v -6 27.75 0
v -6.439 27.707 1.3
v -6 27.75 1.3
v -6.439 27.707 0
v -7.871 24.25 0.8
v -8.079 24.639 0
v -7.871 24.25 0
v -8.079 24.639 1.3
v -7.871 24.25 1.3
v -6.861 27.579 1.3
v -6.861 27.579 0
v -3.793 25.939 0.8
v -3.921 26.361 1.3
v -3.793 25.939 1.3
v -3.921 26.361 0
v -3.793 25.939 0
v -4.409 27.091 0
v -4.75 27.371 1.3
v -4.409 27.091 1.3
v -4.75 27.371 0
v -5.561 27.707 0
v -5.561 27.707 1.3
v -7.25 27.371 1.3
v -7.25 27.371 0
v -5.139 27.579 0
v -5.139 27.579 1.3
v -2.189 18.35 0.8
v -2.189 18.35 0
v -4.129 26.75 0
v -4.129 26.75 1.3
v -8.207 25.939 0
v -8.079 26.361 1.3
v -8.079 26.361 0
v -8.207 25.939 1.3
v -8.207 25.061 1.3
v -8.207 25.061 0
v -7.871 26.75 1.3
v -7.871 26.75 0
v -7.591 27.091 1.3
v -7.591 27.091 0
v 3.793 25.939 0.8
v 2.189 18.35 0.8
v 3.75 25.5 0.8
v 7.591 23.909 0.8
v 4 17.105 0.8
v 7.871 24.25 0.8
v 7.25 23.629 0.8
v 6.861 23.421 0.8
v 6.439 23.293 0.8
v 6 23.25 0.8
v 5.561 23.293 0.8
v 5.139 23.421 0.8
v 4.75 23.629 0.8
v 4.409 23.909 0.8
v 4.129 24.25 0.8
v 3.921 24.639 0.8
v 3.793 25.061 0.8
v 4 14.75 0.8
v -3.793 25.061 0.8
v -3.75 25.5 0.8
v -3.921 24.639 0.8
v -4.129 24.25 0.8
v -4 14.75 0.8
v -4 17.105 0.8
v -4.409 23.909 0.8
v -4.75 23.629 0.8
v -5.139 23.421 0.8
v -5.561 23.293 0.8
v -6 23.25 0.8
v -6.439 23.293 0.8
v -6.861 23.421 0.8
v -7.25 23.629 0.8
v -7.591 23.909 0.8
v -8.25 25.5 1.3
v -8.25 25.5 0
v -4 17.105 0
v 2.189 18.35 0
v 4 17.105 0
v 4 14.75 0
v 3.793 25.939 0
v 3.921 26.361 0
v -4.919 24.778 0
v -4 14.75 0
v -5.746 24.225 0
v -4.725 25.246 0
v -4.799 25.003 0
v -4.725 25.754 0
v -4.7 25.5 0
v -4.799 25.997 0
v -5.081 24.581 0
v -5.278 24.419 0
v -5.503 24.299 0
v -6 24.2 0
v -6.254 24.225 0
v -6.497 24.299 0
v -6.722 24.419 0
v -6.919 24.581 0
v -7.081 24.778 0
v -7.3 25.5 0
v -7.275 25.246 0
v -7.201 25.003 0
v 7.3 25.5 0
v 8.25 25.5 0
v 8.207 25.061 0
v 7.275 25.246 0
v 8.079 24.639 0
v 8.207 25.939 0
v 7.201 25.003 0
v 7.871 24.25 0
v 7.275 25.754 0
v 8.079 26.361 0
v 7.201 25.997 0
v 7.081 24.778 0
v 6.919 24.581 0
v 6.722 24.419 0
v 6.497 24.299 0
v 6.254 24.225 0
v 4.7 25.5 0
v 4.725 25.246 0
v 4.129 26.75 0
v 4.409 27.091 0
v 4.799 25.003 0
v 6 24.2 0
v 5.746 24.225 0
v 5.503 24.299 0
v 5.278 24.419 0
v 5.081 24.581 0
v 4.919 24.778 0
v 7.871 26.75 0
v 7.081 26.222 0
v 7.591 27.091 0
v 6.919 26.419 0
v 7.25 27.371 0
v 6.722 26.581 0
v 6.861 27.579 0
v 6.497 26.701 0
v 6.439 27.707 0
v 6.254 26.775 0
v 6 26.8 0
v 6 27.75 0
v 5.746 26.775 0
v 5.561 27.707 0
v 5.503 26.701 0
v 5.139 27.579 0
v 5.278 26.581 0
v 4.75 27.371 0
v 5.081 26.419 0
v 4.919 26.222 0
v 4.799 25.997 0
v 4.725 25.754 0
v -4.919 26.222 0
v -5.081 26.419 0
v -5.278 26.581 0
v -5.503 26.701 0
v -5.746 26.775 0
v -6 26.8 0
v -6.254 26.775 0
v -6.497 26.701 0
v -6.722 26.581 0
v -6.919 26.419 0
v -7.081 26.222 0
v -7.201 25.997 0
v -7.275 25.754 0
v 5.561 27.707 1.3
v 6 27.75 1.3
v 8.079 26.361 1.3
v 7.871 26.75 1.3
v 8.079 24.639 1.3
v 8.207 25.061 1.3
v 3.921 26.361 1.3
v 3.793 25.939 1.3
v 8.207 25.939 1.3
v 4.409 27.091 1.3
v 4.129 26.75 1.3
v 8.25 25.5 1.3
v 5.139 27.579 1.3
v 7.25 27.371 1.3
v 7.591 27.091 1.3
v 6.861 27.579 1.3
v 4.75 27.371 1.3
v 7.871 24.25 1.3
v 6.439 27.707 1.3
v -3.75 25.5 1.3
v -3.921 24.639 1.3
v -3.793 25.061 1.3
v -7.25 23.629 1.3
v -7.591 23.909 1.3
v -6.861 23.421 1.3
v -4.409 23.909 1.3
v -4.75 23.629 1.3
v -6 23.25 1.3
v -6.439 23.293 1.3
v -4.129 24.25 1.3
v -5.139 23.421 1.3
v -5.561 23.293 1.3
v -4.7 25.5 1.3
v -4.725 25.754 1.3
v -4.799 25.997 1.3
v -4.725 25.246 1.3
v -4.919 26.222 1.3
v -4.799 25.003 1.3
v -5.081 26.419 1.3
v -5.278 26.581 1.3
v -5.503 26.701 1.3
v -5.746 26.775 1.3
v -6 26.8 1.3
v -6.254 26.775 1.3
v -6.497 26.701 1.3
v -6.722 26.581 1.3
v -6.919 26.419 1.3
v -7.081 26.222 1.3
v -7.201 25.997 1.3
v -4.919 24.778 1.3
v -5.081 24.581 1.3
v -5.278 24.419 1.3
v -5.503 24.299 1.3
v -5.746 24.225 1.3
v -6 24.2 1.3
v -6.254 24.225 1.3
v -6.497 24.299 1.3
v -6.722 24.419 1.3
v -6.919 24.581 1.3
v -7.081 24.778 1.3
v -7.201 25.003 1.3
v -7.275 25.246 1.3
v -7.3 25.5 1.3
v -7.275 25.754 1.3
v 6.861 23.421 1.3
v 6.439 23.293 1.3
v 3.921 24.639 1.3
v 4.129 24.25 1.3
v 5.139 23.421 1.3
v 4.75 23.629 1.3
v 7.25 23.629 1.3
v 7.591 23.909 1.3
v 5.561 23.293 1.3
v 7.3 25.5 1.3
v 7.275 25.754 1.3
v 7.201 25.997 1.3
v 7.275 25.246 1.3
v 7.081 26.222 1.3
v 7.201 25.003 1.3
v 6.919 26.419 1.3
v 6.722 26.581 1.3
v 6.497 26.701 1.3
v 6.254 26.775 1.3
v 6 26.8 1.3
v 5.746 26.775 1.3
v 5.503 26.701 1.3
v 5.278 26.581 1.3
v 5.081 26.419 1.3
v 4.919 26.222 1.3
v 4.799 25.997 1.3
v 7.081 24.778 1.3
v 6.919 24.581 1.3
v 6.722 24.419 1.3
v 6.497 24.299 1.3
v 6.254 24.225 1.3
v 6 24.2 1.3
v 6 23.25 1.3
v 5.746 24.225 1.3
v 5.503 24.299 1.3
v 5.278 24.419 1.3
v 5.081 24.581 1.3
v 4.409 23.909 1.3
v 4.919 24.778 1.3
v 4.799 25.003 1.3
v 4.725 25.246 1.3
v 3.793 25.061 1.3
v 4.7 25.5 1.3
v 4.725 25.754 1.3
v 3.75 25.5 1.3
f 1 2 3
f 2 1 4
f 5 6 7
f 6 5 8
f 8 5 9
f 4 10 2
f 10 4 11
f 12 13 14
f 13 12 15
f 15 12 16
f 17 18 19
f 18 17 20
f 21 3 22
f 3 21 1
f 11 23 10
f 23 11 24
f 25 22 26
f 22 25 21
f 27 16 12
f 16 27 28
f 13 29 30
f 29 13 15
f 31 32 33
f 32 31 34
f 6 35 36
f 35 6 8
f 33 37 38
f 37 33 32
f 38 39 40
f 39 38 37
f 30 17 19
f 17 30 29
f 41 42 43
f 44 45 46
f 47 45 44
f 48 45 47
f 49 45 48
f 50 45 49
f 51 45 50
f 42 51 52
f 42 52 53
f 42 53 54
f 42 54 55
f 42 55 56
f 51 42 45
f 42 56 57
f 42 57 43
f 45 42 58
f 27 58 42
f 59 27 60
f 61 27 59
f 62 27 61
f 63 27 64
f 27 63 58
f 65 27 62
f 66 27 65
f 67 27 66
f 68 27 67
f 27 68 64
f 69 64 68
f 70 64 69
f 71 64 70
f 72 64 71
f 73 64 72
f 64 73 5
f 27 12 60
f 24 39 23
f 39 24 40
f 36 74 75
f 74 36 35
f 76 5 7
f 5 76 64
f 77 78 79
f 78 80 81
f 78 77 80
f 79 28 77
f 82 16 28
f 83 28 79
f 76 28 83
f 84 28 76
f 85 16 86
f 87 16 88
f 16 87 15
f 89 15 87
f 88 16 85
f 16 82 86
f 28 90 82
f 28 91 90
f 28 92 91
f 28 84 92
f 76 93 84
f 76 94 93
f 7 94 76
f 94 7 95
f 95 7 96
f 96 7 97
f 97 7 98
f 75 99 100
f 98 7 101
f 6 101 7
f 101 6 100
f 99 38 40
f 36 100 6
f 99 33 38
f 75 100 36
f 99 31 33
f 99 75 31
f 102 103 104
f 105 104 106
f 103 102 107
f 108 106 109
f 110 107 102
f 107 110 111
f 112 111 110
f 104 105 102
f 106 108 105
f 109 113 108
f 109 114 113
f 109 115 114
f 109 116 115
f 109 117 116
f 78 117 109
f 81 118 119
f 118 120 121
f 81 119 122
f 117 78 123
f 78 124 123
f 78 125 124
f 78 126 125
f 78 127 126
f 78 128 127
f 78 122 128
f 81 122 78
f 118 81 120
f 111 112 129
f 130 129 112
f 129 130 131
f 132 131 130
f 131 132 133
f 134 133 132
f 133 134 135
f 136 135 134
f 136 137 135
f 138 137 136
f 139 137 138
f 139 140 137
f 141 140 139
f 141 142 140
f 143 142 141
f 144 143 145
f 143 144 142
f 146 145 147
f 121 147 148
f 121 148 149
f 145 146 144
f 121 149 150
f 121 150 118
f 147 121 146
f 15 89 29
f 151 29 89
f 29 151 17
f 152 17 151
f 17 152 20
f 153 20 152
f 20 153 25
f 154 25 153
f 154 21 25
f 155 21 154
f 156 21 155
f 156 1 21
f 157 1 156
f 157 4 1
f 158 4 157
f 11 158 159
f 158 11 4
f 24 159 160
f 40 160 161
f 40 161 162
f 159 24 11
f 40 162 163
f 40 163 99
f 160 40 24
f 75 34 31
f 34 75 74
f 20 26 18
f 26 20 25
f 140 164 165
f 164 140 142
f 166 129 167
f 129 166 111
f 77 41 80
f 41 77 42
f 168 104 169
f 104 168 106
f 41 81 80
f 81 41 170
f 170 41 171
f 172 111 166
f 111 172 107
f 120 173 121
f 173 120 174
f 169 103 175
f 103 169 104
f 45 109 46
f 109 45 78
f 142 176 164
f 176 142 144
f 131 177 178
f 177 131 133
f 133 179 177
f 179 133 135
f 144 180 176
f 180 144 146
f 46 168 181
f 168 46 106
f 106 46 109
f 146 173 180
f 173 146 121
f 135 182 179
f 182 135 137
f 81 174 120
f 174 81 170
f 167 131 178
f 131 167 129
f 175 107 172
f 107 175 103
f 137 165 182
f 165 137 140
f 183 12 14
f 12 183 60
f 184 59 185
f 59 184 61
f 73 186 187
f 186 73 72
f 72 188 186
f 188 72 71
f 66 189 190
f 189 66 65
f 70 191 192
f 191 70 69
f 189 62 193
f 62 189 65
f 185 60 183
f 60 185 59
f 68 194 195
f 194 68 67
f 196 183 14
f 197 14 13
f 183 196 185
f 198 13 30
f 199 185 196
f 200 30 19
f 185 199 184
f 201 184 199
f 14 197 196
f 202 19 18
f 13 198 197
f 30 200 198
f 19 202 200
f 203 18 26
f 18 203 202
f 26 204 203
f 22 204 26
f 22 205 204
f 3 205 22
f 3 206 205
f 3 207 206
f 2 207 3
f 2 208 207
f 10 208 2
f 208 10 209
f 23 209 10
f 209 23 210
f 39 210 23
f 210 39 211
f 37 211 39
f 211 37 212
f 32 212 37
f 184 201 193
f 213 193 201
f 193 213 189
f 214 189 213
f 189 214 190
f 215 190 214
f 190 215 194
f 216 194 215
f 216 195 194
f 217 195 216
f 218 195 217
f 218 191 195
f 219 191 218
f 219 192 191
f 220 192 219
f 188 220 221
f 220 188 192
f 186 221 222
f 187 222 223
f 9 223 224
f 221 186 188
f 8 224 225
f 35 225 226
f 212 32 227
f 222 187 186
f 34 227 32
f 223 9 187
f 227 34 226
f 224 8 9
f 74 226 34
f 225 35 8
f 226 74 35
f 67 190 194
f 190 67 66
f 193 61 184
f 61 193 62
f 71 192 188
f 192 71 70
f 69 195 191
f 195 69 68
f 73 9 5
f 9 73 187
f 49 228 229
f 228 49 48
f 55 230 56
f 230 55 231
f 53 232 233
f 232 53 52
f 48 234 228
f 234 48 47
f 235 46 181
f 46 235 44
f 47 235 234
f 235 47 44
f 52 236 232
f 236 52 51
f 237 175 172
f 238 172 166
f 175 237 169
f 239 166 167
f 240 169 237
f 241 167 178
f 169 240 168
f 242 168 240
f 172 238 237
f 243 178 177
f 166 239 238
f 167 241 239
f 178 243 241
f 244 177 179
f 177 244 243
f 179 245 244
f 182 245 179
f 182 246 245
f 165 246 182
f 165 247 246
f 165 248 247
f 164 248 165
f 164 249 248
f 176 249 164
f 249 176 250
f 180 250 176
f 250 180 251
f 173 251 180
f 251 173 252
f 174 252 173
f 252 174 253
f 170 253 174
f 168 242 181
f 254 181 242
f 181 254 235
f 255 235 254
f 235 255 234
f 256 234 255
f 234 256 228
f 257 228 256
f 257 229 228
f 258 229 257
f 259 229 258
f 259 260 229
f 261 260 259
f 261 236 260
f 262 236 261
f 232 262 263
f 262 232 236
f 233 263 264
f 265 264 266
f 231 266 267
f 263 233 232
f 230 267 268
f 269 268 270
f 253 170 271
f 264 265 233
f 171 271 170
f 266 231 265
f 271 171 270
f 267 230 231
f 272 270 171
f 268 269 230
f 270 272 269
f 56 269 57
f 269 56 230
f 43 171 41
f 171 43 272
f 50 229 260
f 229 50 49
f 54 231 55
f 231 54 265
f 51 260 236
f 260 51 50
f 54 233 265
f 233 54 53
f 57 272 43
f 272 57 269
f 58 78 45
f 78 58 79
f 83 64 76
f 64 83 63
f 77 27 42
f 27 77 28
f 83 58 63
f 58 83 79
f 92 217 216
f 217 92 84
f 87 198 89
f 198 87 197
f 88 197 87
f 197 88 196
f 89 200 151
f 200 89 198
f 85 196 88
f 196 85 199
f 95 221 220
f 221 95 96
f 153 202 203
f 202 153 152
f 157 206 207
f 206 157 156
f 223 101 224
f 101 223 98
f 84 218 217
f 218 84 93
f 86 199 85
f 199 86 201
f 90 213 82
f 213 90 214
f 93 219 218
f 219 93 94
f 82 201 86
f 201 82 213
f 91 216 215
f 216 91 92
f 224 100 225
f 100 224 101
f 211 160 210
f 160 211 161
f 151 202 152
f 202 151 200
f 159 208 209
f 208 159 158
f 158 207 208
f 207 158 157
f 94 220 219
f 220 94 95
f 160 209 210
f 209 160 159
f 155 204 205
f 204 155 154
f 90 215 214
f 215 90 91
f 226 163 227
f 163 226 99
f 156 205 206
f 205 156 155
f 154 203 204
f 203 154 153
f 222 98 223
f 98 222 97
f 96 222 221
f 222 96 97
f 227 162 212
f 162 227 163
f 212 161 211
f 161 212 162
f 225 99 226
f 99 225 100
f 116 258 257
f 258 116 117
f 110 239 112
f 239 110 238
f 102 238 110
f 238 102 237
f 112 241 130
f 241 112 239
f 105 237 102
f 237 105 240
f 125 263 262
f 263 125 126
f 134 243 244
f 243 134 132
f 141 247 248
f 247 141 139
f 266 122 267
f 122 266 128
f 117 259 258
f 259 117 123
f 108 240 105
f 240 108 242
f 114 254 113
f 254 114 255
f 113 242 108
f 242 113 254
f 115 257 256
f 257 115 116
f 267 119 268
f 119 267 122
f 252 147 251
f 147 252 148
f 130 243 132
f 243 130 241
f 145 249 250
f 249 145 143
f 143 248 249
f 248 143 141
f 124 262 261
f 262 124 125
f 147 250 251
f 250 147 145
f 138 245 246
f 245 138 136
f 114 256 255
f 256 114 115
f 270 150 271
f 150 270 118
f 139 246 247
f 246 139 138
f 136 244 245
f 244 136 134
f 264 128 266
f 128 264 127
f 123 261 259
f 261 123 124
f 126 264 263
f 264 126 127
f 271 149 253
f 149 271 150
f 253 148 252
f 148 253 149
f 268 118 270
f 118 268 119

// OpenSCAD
// file: stack_options.scad
// =========================================================
// BRAILLIX COORDINATED STACK OPTIONS
//
// Default exports remain the audited legacy stack. Render the non-destructive
// shaft-preserving candidate with:
//
//   openscad -D stack_repair_raise=4 ...
//
// The 4 mm value is not arbitrary. With the motor mounting face at world z=41,
// the measured Ø9 x 2 mm collar ends at z=43. A 4 mm cam hub seated on that
// collar puts the cam underside at z=47 and its flat surface at z=49: exactly
// 4 mm above the legacy cam-flat datum. Base standoffs, top plate, cell shell,
// and pod therefore move together by the same amount.
//
// This is a candidate until the real cam/linkage/spring and Hall tests pass.
// =========================================================

stack_repair_raise = is_undef(stack_repair_raise) ? 0 : stack_repair_raise;

assert(stack_repair_raise == 0 || stack_repair_raise == 4,
       "stack_repair_raise must be 0 (legacy audit) or 4 (Option A candidate)");

stack_option_a = stack_repair_raise == 4;
// file: hall_interface.scad
// Candidate Hall interface: retained underside mount, explicit roof and gap.
include <mech_layout.scad>
assert(stack_repair_raise == 0, "Candidate only supports the default motor stack");
hall_body_w=4.1; hall_body_d=3.1; hall_body_t=1.6;
hall_fit=0.4; hall_floor_t=0.4; hall_air_gap=0.4;
hall_wire_w=4; hall_wire_d=0.8;
hall_pocket_x=homing_mag_r*cos(homing_mag_angle);
hall_pocket_y=homing_mag_r*sin(homing_mag_angle);
// 5 - 3.4 pocket - 0.4 roof = 1.2mm recess; body projects below base.
hall_underhang=0.5; // 0.4 body projection + 0.1 assembly allowance
function hall_island_height(repair_raise,plate_thickness)=0;
function hall_pocket_height(repair_raise,plate_thickness)=
    plate_thickness-cam_pocket_depth-hall_floor_t;
module hall_sensor_island(repair_raise,plate_thickness) {}
module hall_sensor_pocket(repair_raise,plate_thickness,plate_width) {
    depth=hall_pocket_height(repair_raise,plate_thickness);
    assert(depth>0 && plate_thickness-cam_pocket_depth-depth>=0.399);
    translate([hall_pocket_x-(hall_body_w+hall_fit)/2,
               hall_pocket_y-(hall_body_d+hall_fit)/2,-0.1])
        cube([hall_body_w+hall_fit,hall_body_d+hall_fit,depth+0.1]);
    translate([-hall_wire_w/2,hall_pocket_y,-0.1])
        cube([hall_wire_w,plate_width/2-hall_pocket_y+1,hall_wire_d+0.1]);
}
// main file
// Separate FDM part. Export bed face down; installed z=-1.3 relative to base.
include <hall_interface.scad>
module hall_retainer() {
    difference() {
        union() {
            translate([-4,homing_mag_r-2.6,0]) cube([8,3.6,0.8]);
            for(sx=[-1,1]) hull() {
                translate([sx*3,homing_mag_r,0]) cylinder(d=2,h=0.8,$fn=32);
                translate([sx*6,25.5,0]) cylinder(d=4.5,h=0.8,$fn=32);
            }
            for(sx=[-1,1]) translate([sx*6,25.5,0]) cylinder(d=4.5,h=1.3,$fn=32);
        }
        for(sx=[-1,1]) translate([sx*6,25.5,-0.1]) cylinder(d=2.6,h=1.5,$fn=32);   // M2 clearance; still passes M2 if printed 0.3 small
    }
}
hall_retainer();
